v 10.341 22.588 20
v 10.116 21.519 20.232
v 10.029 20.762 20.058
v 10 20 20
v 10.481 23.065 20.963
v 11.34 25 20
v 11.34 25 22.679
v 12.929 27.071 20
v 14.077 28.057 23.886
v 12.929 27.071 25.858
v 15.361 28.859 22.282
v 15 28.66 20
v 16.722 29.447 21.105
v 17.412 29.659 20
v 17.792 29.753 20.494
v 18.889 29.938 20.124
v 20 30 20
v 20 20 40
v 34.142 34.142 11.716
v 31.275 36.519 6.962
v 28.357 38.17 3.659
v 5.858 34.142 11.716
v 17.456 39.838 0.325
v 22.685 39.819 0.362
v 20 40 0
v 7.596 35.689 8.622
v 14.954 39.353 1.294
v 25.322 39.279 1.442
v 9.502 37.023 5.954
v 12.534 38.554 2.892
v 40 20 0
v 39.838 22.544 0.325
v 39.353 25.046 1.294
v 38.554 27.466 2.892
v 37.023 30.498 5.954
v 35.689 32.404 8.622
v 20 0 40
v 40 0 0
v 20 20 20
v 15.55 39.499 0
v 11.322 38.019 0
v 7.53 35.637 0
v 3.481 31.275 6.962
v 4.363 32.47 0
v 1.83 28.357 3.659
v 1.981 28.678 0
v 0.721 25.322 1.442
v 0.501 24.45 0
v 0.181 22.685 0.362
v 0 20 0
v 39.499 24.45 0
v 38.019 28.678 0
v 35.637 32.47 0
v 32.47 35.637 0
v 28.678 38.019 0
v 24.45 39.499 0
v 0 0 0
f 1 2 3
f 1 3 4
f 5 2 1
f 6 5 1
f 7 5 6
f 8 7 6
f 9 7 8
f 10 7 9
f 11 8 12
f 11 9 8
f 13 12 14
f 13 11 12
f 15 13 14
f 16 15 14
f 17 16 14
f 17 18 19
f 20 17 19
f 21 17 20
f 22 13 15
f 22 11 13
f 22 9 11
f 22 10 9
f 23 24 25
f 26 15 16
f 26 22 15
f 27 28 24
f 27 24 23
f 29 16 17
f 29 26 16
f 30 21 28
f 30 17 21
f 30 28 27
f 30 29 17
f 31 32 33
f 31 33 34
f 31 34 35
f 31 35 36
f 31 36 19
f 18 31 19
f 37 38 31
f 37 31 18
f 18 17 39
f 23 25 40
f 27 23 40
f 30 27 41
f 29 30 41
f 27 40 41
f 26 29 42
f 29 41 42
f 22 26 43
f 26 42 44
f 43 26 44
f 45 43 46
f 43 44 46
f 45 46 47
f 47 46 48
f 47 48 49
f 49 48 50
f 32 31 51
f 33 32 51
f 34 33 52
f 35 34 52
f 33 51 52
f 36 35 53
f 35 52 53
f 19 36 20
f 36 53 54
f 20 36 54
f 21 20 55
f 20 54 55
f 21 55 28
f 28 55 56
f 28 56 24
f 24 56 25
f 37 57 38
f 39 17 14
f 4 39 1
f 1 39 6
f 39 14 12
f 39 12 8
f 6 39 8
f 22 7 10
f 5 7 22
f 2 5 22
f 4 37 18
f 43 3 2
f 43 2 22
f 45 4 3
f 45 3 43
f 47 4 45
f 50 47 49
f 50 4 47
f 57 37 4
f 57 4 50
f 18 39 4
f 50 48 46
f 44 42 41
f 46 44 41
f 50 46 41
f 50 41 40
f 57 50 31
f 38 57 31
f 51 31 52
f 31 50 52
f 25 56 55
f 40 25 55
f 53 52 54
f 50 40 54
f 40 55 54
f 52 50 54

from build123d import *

# Parameters (mm, degrees)
SKETCH1_W           = 40
SKETCH1_H           = 20
BOSS_EXTRUDE1_DEPTH = 40
CUT_EXTRUDE18_DEPTH = 20
CUT_EXTRUDE20_DEPTH = 59
CUT_EXTRUDE21_DEPTH = 59


with BuildPart() as part:
    # Sketch1 → Boss-Extrude1 (new body)
    with BuildSketch(Plane.XY):
        with BuildLine():
            Line((0, 20), (40, 20))
            ThreePointArc((40, 20), (20, 40), (0, 20))
        make_face()
        with Locations((20, 10)):
            Rectangle(SKETCH1_W, SKETCH1_H)
    extrude(amount=BOSS_EXTRUDE1_DEPTH)

    # Sketch4 → Cut-Extrude18 (cut)
    with BuildSketch(Plane.XY.offset(40)):
        with BuildLine():
            Line((20, 30), (20, 20))
            Line((20, 20), (10, 20))
            ThreePointArc((10, 20), (12.928932188, 27.071067812), (20, 30))
        make_face()
    extrude(amount=-CUT_EXTRUDE18_DEPTH, mode=Mode.SUBTRACT)

    # Sketch11 → Cut-Extrude20 (cut)
    with BuildSketch(Plane(origin=(0, 0, 0), x_dir=(1, 0, 0), z_dir=(0, 1, 0))):
        Polygon((20, -40), (0, 0), (0, -40), align=None)
        Polygon((40, 0), (20, -40), (40, -40), align=None)
    extrude(amount=CUT_EXTRUDE20_DEPTH, mode=Mode.SUBTRACT)

    # Sketch12 → Cut-Extrude21 (cut)
    with BuildSketch(Plane(origin=(0, 0, 0), x_dir=(0, 0, -1), z_dir=(1, 0, 0))):
        Polygon((-40, 20), (0, 40), (-40, 40), align=None)
    extrude(amount=CUT_EXTRUDE21_DEPTH, mode=Mode.SUBTRACT)


solid = part.part
